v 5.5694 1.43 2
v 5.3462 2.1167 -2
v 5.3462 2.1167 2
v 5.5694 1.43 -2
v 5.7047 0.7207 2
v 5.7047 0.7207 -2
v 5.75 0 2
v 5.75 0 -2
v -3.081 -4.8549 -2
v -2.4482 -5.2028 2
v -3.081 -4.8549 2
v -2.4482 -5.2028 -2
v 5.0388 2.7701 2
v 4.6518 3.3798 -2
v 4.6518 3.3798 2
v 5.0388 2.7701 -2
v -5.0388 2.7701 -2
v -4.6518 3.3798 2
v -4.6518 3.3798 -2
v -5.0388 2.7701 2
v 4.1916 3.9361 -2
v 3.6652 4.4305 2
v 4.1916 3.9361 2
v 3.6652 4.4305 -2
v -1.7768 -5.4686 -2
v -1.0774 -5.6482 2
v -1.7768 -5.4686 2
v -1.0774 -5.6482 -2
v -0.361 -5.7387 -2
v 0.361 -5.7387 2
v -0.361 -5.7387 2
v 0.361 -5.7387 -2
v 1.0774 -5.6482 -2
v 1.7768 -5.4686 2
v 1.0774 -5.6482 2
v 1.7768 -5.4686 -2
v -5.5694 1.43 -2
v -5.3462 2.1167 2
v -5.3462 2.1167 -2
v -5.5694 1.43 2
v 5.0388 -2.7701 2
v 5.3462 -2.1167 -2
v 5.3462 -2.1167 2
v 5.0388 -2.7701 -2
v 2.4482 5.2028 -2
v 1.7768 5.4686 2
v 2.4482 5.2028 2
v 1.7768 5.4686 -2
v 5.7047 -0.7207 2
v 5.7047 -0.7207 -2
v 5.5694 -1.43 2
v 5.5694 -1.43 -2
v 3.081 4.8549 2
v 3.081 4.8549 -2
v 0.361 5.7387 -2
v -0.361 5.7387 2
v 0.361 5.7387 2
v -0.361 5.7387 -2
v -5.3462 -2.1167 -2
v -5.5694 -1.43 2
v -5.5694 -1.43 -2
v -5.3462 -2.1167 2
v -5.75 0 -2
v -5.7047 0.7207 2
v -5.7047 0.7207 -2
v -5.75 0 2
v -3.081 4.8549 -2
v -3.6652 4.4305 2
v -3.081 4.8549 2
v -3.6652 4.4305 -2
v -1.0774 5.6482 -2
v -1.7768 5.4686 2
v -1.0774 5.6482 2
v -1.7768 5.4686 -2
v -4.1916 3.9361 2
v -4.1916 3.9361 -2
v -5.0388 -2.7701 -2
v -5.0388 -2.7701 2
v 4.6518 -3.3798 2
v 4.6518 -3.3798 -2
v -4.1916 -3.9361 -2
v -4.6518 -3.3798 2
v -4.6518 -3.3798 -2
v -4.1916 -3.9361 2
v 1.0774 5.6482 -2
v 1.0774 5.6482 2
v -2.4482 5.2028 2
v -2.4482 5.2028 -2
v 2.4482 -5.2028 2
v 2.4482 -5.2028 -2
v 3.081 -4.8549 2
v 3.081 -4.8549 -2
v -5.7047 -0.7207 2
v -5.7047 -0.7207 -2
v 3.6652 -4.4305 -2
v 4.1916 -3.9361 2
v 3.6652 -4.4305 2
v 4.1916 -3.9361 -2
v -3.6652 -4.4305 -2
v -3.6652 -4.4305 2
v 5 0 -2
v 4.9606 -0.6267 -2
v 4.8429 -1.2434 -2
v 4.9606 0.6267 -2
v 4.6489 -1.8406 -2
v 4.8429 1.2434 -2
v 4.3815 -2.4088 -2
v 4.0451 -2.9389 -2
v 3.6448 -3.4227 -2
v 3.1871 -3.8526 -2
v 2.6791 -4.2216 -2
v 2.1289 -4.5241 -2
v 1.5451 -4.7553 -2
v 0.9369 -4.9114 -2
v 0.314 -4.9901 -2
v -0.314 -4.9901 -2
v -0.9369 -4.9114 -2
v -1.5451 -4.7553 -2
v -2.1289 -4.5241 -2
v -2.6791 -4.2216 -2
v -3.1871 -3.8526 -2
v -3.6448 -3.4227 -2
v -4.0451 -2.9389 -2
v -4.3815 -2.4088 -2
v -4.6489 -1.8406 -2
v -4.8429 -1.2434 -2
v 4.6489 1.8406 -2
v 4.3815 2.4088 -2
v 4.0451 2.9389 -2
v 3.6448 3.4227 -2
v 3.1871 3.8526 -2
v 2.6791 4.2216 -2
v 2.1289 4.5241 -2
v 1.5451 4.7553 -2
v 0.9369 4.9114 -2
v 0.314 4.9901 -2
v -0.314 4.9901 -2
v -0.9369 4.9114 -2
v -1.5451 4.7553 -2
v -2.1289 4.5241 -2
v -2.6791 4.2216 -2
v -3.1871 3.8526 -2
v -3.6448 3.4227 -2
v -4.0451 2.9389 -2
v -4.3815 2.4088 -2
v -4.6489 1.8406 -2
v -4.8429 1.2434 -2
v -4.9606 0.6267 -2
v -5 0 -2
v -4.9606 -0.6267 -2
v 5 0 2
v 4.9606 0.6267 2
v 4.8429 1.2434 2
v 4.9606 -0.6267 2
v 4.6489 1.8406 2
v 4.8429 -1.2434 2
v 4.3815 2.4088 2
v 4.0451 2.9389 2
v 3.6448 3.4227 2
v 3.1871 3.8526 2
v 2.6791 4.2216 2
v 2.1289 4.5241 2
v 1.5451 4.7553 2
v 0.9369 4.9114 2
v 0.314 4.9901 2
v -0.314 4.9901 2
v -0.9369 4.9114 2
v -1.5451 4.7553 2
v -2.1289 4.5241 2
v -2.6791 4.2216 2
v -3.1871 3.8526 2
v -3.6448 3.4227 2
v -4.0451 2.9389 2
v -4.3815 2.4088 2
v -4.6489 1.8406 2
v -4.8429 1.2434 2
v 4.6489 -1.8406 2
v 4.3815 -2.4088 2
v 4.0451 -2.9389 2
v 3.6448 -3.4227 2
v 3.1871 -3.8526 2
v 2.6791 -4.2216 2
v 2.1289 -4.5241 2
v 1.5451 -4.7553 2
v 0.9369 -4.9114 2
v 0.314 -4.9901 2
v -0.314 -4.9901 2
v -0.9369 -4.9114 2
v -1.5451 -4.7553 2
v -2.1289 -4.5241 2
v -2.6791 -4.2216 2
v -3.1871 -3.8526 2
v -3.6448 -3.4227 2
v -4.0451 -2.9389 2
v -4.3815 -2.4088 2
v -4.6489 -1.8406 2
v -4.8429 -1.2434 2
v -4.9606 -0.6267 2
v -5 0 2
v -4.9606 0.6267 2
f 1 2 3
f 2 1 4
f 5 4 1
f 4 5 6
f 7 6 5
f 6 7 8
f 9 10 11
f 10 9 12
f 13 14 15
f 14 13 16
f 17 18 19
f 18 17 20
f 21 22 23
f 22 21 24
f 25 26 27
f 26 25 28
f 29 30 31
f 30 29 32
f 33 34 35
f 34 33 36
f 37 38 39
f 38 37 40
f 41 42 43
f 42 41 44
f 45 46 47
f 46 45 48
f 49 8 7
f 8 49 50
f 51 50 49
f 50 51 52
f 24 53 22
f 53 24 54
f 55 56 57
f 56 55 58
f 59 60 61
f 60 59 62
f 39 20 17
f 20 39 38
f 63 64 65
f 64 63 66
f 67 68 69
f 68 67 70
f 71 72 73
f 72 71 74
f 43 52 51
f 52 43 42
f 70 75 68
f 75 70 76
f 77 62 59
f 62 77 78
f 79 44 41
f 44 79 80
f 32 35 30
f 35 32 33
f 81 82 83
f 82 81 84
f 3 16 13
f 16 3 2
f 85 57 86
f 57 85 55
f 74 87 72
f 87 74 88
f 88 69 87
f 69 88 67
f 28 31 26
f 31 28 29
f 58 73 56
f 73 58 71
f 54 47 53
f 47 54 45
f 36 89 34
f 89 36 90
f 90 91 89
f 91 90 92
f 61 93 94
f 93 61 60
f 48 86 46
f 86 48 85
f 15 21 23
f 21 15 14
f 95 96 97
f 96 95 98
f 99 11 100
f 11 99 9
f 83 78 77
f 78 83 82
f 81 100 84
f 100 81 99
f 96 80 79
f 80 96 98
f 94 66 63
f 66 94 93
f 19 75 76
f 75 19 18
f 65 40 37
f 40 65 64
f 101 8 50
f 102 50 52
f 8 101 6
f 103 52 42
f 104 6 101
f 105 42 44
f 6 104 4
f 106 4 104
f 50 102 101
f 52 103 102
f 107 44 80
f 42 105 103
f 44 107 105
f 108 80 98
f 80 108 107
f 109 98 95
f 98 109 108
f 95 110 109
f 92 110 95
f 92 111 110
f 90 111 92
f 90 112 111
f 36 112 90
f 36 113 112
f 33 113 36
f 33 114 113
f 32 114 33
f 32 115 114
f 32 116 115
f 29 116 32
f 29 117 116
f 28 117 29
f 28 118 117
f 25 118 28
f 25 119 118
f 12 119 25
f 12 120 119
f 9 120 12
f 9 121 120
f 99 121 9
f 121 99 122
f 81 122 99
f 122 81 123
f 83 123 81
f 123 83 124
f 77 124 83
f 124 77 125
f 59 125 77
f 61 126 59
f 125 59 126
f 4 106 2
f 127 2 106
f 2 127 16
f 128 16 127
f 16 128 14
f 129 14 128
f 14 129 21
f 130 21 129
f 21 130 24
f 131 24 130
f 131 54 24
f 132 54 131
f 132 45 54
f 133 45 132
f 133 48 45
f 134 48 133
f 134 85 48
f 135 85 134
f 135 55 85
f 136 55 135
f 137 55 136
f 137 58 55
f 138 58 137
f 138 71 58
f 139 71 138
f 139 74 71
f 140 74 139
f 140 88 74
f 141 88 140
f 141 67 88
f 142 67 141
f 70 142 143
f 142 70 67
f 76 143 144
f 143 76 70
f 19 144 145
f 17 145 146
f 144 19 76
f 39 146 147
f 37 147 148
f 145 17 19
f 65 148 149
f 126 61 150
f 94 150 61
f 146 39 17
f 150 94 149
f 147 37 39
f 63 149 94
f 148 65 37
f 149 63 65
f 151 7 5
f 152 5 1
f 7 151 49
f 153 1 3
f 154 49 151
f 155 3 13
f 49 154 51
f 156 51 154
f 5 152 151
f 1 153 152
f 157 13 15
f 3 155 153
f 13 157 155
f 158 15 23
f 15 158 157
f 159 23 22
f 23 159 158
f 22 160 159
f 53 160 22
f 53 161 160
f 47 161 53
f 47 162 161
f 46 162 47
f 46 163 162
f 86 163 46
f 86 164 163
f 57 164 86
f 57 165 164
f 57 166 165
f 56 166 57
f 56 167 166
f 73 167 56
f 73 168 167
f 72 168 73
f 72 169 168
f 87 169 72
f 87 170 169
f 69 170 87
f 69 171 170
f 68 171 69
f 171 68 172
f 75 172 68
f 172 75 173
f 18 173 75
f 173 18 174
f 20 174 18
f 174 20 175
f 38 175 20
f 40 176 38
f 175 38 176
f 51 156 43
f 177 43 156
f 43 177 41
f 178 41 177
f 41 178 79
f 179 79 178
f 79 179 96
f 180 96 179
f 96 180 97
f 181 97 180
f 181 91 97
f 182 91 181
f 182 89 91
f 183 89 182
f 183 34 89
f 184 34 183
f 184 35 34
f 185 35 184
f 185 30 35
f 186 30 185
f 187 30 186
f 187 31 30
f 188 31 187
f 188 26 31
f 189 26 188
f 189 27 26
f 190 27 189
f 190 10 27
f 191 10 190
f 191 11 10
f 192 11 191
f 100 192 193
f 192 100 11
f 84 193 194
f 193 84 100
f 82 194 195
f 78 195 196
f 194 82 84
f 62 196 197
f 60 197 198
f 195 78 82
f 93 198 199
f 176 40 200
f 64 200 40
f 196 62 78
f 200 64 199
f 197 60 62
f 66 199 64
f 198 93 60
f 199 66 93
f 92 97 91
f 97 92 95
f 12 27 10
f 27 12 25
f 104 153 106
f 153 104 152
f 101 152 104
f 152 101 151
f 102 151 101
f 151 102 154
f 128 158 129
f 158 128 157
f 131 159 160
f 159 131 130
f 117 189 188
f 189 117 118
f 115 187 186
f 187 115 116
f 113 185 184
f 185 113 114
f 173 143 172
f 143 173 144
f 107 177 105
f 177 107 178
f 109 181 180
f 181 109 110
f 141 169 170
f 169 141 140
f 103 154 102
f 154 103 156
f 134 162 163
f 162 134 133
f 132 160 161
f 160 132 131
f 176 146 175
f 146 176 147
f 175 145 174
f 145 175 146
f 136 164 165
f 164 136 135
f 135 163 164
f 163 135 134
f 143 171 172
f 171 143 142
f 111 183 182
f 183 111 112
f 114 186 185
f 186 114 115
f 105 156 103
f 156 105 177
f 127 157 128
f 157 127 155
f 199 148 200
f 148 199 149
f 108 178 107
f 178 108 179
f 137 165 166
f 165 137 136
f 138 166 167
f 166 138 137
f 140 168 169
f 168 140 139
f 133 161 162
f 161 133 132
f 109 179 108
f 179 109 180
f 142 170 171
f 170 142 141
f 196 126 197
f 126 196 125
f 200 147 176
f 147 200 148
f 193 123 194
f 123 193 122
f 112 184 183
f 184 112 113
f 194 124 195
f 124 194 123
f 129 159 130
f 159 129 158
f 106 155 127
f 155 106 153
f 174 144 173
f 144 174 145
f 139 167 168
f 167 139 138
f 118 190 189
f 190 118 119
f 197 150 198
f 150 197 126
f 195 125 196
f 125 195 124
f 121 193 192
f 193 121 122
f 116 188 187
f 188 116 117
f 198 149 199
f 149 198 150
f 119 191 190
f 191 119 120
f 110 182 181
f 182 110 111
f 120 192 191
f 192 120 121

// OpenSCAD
$fn = 50;


difference() {
	union() {
		translate(v = [0, 0, -2.0000000000]) {
			cylinder(h = 4, r = 5.7500000000);
		}
	}
	union() {
		translate(v = [0, 0, -100.0000000000]) {
			cylinder(h = 200, r = 5.0000000000);
		}
	}
}
